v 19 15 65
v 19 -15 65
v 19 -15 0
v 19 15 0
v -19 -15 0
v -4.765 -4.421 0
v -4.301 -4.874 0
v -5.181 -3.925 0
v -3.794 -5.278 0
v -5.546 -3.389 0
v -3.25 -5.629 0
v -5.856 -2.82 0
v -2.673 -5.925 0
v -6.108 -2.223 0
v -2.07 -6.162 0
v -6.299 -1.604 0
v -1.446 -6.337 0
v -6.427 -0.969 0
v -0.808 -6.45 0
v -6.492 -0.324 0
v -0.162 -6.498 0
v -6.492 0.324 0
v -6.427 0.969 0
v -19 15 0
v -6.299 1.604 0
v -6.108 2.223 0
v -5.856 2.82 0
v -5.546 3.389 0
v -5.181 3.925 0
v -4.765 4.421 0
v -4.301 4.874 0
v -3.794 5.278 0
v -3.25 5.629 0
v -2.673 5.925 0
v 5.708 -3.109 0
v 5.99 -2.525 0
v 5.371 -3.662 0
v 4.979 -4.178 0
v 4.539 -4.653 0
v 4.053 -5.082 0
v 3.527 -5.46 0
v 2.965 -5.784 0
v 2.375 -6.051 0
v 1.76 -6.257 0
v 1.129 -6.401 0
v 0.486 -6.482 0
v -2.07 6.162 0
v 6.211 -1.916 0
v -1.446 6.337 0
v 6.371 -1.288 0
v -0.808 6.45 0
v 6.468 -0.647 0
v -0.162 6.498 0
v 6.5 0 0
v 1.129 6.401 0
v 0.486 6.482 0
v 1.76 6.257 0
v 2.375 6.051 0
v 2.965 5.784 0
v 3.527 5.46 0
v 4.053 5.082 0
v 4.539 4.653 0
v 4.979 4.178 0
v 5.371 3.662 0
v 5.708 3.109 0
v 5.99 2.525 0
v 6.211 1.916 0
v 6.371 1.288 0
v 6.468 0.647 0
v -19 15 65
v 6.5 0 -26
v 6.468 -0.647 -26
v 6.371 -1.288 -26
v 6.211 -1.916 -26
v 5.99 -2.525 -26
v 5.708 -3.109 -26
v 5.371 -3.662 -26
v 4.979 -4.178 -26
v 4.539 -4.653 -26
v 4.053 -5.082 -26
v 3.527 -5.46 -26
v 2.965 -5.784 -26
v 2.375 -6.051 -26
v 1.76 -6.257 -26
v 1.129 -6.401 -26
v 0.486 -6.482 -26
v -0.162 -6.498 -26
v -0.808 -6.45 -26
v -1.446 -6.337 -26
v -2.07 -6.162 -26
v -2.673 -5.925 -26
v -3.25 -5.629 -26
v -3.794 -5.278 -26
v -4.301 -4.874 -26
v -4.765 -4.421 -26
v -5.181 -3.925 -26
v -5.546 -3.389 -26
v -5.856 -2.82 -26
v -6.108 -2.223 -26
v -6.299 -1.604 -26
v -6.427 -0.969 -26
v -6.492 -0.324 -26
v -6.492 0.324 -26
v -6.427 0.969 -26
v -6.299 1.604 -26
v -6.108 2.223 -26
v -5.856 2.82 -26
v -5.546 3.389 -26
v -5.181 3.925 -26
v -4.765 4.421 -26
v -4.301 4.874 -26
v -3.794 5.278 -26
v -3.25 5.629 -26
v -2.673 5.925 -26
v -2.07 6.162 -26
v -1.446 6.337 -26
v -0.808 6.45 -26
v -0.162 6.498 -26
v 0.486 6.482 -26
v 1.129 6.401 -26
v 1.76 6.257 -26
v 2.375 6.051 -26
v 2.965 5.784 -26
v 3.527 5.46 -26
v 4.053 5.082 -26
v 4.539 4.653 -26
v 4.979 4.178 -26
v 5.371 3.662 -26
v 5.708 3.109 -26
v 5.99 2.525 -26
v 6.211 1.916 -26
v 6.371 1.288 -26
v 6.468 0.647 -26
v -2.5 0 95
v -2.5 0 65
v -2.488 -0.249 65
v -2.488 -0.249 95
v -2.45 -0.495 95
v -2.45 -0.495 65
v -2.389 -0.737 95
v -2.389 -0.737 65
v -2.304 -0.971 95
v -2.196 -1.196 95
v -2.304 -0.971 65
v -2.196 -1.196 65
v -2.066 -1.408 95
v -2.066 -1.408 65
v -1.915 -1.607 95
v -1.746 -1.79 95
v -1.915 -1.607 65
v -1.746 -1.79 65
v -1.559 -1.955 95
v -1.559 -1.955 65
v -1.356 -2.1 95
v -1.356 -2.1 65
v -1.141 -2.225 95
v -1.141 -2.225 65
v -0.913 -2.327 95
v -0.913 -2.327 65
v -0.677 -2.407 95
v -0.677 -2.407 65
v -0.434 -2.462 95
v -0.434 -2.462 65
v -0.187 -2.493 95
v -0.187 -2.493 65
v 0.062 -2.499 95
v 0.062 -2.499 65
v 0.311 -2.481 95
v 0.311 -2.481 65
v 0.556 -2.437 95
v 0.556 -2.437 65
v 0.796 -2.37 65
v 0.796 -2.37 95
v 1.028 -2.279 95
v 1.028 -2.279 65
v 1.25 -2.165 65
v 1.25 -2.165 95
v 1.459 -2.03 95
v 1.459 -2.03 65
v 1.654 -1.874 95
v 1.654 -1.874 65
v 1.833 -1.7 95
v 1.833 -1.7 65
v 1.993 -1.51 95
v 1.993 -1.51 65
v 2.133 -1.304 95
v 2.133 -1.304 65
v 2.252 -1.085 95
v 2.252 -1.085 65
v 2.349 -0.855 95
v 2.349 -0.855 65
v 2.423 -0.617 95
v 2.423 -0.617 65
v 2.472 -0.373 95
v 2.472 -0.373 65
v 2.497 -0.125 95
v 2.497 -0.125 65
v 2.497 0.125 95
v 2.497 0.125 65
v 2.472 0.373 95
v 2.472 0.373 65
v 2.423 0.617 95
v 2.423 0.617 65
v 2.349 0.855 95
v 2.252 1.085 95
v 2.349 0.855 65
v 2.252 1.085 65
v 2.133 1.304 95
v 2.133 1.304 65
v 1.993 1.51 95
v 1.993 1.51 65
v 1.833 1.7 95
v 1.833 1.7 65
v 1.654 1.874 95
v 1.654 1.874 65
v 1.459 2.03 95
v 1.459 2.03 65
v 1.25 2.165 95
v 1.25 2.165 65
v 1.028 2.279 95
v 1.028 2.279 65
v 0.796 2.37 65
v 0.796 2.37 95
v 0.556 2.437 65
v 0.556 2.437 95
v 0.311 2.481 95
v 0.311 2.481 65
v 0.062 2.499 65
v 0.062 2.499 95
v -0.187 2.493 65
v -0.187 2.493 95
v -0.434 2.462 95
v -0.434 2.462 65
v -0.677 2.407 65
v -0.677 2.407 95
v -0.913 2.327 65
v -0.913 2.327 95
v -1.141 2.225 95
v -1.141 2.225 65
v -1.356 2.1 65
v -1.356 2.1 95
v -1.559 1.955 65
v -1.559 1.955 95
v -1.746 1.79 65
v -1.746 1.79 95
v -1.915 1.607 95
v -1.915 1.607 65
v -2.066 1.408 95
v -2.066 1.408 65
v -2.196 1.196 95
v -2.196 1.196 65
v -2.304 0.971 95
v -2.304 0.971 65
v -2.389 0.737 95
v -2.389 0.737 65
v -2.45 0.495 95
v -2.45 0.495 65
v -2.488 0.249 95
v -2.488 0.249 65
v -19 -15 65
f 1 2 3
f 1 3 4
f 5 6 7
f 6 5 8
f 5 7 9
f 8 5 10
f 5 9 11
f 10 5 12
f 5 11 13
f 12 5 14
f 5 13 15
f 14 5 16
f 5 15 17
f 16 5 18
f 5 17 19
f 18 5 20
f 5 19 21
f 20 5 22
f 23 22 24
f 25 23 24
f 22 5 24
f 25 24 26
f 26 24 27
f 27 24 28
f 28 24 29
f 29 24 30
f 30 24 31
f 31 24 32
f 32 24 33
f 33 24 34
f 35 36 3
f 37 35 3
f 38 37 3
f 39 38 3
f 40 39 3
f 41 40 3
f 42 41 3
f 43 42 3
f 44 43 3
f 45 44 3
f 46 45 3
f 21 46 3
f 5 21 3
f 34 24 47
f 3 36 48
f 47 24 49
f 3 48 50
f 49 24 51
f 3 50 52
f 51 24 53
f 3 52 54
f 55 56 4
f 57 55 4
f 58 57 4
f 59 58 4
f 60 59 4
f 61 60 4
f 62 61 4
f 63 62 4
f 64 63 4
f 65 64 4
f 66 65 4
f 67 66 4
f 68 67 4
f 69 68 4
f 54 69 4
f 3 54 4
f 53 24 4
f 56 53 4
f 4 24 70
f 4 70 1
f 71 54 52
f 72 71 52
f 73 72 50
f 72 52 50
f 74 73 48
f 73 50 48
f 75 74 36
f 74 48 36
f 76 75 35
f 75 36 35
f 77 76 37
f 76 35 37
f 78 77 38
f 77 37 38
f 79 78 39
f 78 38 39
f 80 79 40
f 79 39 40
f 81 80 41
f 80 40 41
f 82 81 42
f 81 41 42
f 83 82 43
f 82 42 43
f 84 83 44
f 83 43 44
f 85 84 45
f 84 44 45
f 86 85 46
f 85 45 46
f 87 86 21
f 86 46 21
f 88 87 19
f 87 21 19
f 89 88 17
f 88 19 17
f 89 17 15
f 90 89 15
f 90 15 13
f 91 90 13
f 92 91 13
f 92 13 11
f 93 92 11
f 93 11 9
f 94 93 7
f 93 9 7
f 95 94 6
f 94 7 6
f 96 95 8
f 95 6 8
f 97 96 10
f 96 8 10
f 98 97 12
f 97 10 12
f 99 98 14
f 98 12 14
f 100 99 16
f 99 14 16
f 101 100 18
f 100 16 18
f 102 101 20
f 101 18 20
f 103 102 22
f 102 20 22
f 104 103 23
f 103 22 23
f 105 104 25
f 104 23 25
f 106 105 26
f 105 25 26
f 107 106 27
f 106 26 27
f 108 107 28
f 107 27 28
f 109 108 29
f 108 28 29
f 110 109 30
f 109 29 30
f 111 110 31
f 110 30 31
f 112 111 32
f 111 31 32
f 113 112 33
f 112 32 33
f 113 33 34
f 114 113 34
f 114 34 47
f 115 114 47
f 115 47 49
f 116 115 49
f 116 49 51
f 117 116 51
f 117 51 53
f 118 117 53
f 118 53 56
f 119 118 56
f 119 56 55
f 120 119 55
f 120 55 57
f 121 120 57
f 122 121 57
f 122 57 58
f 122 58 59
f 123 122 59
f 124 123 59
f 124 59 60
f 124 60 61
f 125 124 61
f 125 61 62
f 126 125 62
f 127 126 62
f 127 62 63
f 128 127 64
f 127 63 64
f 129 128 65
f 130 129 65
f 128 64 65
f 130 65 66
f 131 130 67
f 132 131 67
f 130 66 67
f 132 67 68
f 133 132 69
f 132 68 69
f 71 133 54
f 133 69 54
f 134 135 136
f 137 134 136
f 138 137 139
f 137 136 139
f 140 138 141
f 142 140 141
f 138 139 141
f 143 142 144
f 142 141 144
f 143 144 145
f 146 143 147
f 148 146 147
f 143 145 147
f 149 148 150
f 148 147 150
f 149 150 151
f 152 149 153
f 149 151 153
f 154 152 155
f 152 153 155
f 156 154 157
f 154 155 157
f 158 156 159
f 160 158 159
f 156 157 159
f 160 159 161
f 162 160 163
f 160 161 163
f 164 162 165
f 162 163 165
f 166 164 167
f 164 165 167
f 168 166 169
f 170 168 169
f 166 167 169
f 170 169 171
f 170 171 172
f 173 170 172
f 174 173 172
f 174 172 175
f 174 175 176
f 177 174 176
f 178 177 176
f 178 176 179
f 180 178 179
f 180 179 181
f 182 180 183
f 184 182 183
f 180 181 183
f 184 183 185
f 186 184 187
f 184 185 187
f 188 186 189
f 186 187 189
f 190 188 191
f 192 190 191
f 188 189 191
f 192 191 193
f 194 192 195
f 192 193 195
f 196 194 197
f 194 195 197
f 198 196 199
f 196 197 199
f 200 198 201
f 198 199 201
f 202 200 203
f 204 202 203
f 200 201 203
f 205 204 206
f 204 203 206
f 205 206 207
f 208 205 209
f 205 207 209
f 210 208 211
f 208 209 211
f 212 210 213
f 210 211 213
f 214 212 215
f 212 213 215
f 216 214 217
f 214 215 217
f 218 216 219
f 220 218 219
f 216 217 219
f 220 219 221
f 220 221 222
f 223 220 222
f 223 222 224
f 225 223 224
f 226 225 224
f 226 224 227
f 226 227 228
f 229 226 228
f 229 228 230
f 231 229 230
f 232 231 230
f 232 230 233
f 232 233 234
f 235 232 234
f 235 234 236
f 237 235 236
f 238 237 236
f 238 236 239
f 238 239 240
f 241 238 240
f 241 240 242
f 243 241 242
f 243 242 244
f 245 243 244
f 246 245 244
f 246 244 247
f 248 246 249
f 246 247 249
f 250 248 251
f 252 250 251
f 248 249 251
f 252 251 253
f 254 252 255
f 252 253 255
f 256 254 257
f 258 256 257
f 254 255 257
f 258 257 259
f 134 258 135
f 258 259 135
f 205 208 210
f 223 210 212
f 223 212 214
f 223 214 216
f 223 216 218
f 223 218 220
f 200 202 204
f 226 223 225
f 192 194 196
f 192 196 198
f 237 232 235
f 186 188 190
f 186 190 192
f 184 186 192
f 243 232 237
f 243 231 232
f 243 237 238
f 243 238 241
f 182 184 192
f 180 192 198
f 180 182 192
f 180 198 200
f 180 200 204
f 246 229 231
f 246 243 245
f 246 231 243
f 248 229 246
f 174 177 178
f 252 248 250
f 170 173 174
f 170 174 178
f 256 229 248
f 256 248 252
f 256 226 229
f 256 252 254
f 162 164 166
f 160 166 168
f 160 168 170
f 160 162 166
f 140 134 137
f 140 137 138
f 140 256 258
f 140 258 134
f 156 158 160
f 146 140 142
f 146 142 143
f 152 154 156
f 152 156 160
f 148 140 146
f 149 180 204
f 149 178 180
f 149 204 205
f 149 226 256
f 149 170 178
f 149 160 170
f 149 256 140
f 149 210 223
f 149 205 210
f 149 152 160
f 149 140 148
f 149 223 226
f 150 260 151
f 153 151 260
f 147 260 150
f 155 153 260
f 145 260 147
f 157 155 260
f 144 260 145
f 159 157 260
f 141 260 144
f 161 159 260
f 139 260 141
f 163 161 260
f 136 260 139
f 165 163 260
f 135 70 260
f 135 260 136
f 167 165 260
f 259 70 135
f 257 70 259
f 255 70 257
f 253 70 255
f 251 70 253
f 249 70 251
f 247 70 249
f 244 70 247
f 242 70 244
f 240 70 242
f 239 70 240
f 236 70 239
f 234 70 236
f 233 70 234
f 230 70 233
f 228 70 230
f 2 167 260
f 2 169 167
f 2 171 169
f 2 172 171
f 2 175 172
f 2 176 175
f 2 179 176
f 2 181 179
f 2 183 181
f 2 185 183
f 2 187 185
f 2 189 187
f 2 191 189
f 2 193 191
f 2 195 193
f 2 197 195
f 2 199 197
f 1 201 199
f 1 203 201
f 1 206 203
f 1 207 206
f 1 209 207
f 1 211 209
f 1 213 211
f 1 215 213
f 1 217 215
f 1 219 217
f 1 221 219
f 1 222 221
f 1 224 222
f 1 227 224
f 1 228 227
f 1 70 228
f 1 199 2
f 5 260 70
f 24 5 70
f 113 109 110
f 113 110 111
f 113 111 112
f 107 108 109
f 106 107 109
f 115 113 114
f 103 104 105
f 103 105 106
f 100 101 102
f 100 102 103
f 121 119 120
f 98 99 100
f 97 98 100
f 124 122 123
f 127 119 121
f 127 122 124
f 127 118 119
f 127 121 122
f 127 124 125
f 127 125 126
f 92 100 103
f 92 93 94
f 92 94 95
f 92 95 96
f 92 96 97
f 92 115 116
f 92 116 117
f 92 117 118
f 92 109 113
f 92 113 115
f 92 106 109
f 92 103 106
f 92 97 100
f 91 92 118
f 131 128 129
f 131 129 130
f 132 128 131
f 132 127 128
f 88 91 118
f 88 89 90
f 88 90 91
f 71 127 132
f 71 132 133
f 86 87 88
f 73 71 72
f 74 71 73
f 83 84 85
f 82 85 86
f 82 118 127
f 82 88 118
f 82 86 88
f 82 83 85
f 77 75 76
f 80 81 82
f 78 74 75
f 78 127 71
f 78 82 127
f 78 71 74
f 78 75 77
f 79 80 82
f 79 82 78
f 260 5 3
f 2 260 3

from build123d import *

# Parameters (mm, degrees)
SKETCH1_W           = 38
SKETCH1_H           = 30
BOSS_EXTRUDE1_DEPTH = 65
SKETCH2_R           = 2.5
BOSS_EXTRUDE2_DEPTH = 30
SKETCH3_R           = 6.5
BOSS_EXTRUDE3_DEPTH = 26


with BuildPart() as part:
    # Sketch1 → Boss-Extrude1 (new body)
    with BuildSketch(Plane.XY):
        Rectangle(SKETCH1_W, SKETCH1_H)
    extrude(amount=BOSS_EXTRUDE1_DEPTH)

    # Sketch2 → Boss-Extrude2 (add)
    with BuildSketch(Plane.XY.offset(65)):
        with Locations(Location((0, 0, 0), (0, 0, 180))):
            Circle(SKETCH2_R)
    extrude(amount=BOSS_EXTRUDE2_DEPTH)

    # Sketch3 → Boss-Extrude3 (add)
    with BuildSketch(Plane(origin=(0, 0, 0), x_dir=(-1, 0, 0), z_dir=(0, 0, -1))):
        with Locations(Location((0, 0, 0), (0, 0, 180))):
            Circle(SKETCH3_R)
    extrude(amount=BOSS_EXTRUDE3_DEPTH)


solid = part.part
